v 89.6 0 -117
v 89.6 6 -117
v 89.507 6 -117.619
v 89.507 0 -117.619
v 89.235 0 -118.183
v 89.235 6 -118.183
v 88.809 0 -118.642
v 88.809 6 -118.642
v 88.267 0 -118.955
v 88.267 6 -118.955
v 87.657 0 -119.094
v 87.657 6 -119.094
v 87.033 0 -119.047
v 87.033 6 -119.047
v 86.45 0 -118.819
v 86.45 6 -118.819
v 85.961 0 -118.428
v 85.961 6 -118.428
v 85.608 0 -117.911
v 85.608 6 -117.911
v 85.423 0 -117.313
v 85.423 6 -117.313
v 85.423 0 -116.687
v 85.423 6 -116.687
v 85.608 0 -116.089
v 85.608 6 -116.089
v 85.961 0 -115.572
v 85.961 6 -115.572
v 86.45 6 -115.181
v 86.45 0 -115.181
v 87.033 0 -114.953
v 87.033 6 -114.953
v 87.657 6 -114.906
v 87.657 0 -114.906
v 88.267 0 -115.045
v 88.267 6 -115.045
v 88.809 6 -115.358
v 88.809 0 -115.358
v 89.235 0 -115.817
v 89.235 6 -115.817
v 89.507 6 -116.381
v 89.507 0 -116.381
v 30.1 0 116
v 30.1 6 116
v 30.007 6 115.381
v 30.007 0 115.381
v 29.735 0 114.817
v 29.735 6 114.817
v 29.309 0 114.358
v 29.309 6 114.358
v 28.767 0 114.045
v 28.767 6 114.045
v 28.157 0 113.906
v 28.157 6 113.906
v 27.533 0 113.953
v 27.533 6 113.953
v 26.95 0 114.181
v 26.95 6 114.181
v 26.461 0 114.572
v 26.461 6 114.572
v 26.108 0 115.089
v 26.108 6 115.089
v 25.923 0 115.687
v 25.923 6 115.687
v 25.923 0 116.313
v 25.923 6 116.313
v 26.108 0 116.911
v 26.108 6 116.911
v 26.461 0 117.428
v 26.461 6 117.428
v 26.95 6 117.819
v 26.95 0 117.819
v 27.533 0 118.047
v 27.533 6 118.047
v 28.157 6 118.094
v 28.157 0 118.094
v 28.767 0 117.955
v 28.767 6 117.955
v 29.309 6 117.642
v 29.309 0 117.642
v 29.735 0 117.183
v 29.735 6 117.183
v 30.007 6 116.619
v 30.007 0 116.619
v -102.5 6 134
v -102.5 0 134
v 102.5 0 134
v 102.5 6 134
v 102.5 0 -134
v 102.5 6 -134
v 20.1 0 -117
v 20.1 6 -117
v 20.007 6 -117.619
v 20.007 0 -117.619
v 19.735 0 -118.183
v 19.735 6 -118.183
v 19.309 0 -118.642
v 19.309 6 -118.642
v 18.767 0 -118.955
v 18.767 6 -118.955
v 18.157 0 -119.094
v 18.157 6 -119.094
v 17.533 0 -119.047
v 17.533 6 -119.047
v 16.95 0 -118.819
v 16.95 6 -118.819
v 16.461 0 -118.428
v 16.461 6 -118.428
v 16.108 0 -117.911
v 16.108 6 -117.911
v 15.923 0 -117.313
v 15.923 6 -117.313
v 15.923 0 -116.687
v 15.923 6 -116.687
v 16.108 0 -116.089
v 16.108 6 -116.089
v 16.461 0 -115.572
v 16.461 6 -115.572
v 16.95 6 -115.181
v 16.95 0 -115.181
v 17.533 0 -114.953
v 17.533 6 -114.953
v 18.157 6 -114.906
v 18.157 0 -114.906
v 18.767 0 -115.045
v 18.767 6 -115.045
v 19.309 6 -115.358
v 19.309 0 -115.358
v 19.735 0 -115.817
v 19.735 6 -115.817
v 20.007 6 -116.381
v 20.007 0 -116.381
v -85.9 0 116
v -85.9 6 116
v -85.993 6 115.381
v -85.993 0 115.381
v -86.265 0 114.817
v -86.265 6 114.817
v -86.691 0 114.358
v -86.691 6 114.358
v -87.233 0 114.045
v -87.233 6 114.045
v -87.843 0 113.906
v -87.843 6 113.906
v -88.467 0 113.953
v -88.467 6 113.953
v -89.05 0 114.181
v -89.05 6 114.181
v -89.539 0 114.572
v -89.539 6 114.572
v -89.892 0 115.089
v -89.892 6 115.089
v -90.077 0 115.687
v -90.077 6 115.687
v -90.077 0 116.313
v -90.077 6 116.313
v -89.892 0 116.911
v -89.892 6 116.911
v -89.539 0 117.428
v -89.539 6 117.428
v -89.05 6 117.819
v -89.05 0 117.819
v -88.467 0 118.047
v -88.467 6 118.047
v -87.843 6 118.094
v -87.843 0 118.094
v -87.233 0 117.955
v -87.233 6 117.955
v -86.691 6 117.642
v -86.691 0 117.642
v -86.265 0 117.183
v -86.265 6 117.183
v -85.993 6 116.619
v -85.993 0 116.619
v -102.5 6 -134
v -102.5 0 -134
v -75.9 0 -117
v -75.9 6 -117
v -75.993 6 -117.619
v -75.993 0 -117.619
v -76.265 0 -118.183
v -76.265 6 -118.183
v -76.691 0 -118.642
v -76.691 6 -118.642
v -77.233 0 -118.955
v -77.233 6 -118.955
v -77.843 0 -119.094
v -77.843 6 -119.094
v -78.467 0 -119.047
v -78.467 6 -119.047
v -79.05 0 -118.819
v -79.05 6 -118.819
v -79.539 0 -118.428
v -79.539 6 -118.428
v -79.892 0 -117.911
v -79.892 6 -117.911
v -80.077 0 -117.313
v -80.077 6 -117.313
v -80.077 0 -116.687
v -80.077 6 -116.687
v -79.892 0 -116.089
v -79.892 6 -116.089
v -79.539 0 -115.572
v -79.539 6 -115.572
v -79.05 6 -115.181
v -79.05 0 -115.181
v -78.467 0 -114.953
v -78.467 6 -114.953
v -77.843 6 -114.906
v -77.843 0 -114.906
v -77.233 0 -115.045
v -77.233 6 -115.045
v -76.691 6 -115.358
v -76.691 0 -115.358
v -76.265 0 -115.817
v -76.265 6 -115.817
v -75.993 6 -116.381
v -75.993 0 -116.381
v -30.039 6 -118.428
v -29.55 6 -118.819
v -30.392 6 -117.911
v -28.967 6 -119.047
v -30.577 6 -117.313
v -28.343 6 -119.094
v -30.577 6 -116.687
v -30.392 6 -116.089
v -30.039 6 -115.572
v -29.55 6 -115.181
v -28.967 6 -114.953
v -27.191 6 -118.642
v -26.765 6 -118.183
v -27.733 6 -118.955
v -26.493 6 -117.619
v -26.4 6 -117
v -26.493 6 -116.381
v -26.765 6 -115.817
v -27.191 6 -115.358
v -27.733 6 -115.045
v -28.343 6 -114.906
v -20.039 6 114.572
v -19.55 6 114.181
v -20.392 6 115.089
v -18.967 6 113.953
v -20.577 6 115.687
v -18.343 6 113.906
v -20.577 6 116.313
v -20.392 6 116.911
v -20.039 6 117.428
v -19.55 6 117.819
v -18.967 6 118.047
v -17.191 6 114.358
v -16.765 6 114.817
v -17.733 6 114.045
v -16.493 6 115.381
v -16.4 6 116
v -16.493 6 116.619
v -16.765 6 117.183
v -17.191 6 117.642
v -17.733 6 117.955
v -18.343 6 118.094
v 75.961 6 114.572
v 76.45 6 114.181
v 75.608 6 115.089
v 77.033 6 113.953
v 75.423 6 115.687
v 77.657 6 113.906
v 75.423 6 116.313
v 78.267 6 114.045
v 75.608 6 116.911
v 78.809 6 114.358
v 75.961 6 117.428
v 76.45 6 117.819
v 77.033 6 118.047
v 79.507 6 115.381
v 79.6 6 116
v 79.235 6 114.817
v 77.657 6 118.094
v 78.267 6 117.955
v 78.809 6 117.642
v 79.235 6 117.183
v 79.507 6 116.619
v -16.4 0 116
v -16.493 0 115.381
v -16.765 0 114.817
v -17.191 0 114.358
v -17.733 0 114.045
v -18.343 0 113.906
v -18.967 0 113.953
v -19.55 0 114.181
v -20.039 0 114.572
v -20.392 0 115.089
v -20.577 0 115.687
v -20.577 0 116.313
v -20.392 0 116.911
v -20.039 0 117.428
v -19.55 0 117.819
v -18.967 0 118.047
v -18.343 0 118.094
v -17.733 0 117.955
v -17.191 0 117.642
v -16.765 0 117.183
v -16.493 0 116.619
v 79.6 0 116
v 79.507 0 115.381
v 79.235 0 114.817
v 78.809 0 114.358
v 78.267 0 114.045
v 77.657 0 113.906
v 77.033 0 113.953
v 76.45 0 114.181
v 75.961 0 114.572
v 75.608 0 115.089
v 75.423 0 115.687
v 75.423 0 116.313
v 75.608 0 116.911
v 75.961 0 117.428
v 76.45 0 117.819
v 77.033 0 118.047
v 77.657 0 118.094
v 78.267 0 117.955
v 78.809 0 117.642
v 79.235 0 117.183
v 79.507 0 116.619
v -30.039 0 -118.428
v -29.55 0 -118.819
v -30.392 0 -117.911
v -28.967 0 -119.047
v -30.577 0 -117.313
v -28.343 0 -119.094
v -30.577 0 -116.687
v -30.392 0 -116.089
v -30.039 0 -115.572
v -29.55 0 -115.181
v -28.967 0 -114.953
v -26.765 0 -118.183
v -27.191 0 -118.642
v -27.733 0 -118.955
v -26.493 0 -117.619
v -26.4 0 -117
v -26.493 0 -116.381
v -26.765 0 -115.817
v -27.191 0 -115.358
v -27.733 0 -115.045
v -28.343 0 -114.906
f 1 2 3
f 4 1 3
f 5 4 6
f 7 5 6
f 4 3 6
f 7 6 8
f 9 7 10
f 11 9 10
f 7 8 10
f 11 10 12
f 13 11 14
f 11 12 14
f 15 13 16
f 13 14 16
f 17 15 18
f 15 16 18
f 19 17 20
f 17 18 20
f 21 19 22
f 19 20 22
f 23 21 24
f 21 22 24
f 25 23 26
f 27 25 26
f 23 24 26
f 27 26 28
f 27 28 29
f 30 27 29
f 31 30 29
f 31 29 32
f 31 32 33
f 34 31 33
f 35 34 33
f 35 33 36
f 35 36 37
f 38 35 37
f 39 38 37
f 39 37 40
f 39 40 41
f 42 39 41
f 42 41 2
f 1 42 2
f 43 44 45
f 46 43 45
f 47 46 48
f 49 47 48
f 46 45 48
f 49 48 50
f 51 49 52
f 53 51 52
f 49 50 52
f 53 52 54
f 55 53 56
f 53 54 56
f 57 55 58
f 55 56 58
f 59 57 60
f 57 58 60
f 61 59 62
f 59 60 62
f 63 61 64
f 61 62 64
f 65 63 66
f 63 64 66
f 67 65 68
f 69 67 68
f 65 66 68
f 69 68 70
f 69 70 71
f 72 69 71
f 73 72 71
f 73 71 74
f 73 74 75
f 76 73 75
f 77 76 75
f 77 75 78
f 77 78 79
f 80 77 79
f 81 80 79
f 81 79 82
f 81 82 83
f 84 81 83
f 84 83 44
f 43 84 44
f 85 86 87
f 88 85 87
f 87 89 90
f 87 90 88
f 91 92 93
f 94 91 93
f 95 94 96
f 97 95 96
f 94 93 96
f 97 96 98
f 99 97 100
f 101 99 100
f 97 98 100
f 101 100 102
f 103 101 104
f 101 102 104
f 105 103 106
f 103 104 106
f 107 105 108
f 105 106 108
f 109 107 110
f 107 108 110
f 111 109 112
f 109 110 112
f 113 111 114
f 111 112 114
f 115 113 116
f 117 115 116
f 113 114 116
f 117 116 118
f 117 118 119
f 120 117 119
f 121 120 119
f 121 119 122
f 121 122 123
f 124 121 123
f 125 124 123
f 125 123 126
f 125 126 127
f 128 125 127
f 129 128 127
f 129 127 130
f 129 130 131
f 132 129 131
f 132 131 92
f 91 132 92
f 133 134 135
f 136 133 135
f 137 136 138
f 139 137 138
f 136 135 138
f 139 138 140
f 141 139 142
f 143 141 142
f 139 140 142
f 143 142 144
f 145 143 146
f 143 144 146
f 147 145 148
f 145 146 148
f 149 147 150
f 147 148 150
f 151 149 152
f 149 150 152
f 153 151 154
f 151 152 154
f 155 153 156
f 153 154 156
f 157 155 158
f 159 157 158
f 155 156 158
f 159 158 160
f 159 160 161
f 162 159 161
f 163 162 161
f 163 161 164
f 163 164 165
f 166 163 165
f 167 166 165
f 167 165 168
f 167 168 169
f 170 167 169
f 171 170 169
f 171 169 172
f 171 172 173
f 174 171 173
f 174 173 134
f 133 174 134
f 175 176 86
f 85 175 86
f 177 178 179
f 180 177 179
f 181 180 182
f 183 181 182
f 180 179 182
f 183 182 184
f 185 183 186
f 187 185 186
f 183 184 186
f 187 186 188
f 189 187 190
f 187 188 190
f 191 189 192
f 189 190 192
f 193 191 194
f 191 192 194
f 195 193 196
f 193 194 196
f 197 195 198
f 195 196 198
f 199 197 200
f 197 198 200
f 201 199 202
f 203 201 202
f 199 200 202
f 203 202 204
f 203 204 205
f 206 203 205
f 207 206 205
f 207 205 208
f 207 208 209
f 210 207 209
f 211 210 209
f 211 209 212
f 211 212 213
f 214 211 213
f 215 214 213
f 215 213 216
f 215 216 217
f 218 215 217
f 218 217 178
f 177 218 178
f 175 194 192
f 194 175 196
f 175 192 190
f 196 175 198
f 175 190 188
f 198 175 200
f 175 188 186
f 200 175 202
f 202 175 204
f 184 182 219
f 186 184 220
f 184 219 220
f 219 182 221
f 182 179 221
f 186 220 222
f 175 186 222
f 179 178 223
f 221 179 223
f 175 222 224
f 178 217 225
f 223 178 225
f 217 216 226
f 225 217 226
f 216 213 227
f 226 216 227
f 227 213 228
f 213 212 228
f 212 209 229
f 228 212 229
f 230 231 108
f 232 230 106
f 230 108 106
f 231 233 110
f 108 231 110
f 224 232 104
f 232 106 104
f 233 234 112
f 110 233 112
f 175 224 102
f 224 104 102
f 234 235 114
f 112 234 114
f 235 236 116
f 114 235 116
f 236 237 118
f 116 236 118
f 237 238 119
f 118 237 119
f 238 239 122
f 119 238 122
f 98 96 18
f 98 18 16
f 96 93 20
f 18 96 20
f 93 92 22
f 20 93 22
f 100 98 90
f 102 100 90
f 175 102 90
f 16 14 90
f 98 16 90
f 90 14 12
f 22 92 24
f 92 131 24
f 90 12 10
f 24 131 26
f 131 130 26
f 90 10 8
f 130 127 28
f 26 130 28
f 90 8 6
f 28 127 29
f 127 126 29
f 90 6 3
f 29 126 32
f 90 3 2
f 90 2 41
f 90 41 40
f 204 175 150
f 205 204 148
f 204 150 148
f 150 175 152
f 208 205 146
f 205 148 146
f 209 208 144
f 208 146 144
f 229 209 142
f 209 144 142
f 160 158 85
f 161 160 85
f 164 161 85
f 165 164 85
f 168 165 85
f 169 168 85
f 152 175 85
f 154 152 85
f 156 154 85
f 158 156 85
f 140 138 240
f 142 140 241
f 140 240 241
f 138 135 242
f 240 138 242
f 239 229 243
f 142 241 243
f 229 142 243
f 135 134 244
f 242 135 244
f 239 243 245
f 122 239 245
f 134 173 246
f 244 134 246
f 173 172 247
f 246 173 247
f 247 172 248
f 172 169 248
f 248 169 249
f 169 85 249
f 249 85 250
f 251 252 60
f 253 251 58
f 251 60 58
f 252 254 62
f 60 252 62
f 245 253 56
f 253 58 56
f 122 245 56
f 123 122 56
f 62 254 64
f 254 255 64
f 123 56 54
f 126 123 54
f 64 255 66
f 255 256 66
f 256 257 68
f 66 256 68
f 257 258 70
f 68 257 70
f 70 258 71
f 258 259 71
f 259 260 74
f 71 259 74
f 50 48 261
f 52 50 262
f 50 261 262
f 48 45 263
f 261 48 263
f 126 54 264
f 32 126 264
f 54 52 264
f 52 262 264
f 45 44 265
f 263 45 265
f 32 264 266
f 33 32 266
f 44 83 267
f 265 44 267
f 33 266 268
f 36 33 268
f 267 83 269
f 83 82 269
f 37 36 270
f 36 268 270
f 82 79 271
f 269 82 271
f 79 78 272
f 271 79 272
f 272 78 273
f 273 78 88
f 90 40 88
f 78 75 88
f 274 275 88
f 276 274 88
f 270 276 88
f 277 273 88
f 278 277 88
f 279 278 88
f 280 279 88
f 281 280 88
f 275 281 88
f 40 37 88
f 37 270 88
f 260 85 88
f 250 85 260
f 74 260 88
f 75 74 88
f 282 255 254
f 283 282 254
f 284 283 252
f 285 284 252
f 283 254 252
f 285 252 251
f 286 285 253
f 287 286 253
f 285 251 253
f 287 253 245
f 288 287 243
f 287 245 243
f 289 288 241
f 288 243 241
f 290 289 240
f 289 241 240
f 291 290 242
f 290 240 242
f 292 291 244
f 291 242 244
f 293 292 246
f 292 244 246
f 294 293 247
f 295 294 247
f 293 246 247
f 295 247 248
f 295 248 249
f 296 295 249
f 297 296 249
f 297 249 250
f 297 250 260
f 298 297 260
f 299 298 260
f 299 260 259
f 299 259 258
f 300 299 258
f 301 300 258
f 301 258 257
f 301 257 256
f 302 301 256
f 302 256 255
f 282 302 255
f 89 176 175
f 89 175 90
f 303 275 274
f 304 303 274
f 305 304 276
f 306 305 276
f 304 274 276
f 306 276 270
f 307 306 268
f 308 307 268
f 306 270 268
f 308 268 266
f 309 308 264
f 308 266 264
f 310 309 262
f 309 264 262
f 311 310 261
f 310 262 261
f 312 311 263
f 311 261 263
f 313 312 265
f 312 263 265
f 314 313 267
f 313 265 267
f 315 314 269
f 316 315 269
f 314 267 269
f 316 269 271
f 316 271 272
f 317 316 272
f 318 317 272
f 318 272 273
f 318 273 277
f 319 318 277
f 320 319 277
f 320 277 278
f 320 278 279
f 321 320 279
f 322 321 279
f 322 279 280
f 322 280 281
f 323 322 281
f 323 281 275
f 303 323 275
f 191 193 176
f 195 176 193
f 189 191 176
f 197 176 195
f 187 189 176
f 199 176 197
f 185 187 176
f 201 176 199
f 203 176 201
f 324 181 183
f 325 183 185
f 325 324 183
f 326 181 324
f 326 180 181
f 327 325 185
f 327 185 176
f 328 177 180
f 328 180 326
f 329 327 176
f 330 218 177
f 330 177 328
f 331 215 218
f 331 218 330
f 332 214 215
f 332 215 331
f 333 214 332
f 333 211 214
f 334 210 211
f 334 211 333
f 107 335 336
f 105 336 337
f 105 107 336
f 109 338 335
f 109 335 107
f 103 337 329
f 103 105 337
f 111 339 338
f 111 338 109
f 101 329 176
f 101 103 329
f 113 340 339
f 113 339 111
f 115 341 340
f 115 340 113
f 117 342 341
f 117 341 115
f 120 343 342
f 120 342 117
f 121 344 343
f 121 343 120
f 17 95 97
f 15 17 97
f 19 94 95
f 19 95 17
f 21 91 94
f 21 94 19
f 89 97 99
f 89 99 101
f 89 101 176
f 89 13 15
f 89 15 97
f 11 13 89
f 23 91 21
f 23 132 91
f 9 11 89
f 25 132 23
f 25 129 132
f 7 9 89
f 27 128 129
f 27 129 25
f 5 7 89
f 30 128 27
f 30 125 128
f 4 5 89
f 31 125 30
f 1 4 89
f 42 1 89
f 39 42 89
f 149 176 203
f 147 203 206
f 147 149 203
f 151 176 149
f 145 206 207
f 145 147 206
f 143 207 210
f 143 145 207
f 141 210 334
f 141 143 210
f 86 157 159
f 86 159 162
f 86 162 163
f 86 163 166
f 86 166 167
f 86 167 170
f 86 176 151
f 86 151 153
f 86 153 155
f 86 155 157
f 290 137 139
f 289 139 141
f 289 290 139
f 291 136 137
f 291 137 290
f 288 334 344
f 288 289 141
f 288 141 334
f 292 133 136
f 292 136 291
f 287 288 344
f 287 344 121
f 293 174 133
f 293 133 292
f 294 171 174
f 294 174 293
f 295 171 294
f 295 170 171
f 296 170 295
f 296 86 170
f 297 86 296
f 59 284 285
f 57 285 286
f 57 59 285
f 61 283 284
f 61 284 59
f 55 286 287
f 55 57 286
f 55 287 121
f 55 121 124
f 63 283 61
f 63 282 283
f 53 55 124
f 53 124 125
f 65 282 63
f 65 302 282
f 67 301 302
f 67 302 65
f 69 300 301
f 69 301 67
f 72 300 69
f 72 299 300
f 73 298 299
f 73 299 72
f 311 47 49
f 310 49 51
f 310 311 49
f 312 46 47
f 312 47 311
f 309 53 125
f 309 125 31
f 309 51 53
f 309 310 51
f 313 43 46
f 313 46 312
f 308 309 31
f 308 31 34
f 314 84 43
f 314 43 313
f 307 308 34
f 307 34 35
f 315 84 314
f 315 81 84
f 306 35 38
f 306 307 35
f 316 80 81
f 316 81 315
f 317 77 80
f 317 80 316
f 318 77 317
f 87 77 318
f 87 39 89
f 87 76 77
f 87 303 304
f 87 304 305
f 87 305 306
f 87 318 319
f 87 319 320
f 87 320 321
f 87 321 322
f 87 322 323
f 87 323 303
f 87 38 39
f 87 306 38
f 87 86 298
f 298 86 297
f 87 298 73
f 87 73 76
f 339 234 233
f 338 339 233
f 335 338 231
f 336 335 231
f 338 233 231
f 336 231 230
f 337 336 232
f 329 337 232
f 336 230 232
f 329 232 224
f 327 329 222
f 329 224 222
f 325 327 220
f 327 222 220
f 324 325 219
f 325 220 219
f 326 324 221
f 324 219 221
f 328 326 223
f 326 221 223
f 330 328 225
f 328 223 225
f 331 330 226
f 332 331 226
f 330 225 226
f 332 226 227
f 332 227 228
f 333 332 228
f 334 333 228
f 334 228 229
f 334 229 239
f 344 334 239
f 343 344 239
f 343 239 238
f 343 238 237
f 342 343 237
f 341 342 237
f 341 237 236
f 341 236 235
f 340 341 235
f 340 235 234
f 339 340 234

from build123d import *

# Parameters (mm, degrees)
ESBO_O1_W                  = 205
ESBO_O1_H                  = 268
RESSALTO_EXTRUS_O1_DEPTH   = 6
FURO_DE_DI_METRO_4_0_4_1_D = 4.2


with BuildPart() as part:
    # Esboço1 → Ressalto-extrusão1 (new body)
    with BuildSketch(Plane.XZ):
        Rectangle(ESBO_O1_W, ESBO_O1_H)
    extrude(amount=-RESSALTO_EXTRUS_O1_DEPTH)

    # Furo de diâmetro Ø4.0 (4)1 (through all)
    with Locations(Plane(origin=(0, 0, 0), x_dir=(-1, 0, 0), z_dir=(0, -1, 0))):
        with Locations((-87.5, 117), (-18, 117), (-77.5, -116), (-28, -116), (18.5, -116), (88, -116), (28.5, 117), (78, 117)):
            Hole(FURO_DE_DI_METRO_4_0_4_1_D / 2)


solid = part.part
